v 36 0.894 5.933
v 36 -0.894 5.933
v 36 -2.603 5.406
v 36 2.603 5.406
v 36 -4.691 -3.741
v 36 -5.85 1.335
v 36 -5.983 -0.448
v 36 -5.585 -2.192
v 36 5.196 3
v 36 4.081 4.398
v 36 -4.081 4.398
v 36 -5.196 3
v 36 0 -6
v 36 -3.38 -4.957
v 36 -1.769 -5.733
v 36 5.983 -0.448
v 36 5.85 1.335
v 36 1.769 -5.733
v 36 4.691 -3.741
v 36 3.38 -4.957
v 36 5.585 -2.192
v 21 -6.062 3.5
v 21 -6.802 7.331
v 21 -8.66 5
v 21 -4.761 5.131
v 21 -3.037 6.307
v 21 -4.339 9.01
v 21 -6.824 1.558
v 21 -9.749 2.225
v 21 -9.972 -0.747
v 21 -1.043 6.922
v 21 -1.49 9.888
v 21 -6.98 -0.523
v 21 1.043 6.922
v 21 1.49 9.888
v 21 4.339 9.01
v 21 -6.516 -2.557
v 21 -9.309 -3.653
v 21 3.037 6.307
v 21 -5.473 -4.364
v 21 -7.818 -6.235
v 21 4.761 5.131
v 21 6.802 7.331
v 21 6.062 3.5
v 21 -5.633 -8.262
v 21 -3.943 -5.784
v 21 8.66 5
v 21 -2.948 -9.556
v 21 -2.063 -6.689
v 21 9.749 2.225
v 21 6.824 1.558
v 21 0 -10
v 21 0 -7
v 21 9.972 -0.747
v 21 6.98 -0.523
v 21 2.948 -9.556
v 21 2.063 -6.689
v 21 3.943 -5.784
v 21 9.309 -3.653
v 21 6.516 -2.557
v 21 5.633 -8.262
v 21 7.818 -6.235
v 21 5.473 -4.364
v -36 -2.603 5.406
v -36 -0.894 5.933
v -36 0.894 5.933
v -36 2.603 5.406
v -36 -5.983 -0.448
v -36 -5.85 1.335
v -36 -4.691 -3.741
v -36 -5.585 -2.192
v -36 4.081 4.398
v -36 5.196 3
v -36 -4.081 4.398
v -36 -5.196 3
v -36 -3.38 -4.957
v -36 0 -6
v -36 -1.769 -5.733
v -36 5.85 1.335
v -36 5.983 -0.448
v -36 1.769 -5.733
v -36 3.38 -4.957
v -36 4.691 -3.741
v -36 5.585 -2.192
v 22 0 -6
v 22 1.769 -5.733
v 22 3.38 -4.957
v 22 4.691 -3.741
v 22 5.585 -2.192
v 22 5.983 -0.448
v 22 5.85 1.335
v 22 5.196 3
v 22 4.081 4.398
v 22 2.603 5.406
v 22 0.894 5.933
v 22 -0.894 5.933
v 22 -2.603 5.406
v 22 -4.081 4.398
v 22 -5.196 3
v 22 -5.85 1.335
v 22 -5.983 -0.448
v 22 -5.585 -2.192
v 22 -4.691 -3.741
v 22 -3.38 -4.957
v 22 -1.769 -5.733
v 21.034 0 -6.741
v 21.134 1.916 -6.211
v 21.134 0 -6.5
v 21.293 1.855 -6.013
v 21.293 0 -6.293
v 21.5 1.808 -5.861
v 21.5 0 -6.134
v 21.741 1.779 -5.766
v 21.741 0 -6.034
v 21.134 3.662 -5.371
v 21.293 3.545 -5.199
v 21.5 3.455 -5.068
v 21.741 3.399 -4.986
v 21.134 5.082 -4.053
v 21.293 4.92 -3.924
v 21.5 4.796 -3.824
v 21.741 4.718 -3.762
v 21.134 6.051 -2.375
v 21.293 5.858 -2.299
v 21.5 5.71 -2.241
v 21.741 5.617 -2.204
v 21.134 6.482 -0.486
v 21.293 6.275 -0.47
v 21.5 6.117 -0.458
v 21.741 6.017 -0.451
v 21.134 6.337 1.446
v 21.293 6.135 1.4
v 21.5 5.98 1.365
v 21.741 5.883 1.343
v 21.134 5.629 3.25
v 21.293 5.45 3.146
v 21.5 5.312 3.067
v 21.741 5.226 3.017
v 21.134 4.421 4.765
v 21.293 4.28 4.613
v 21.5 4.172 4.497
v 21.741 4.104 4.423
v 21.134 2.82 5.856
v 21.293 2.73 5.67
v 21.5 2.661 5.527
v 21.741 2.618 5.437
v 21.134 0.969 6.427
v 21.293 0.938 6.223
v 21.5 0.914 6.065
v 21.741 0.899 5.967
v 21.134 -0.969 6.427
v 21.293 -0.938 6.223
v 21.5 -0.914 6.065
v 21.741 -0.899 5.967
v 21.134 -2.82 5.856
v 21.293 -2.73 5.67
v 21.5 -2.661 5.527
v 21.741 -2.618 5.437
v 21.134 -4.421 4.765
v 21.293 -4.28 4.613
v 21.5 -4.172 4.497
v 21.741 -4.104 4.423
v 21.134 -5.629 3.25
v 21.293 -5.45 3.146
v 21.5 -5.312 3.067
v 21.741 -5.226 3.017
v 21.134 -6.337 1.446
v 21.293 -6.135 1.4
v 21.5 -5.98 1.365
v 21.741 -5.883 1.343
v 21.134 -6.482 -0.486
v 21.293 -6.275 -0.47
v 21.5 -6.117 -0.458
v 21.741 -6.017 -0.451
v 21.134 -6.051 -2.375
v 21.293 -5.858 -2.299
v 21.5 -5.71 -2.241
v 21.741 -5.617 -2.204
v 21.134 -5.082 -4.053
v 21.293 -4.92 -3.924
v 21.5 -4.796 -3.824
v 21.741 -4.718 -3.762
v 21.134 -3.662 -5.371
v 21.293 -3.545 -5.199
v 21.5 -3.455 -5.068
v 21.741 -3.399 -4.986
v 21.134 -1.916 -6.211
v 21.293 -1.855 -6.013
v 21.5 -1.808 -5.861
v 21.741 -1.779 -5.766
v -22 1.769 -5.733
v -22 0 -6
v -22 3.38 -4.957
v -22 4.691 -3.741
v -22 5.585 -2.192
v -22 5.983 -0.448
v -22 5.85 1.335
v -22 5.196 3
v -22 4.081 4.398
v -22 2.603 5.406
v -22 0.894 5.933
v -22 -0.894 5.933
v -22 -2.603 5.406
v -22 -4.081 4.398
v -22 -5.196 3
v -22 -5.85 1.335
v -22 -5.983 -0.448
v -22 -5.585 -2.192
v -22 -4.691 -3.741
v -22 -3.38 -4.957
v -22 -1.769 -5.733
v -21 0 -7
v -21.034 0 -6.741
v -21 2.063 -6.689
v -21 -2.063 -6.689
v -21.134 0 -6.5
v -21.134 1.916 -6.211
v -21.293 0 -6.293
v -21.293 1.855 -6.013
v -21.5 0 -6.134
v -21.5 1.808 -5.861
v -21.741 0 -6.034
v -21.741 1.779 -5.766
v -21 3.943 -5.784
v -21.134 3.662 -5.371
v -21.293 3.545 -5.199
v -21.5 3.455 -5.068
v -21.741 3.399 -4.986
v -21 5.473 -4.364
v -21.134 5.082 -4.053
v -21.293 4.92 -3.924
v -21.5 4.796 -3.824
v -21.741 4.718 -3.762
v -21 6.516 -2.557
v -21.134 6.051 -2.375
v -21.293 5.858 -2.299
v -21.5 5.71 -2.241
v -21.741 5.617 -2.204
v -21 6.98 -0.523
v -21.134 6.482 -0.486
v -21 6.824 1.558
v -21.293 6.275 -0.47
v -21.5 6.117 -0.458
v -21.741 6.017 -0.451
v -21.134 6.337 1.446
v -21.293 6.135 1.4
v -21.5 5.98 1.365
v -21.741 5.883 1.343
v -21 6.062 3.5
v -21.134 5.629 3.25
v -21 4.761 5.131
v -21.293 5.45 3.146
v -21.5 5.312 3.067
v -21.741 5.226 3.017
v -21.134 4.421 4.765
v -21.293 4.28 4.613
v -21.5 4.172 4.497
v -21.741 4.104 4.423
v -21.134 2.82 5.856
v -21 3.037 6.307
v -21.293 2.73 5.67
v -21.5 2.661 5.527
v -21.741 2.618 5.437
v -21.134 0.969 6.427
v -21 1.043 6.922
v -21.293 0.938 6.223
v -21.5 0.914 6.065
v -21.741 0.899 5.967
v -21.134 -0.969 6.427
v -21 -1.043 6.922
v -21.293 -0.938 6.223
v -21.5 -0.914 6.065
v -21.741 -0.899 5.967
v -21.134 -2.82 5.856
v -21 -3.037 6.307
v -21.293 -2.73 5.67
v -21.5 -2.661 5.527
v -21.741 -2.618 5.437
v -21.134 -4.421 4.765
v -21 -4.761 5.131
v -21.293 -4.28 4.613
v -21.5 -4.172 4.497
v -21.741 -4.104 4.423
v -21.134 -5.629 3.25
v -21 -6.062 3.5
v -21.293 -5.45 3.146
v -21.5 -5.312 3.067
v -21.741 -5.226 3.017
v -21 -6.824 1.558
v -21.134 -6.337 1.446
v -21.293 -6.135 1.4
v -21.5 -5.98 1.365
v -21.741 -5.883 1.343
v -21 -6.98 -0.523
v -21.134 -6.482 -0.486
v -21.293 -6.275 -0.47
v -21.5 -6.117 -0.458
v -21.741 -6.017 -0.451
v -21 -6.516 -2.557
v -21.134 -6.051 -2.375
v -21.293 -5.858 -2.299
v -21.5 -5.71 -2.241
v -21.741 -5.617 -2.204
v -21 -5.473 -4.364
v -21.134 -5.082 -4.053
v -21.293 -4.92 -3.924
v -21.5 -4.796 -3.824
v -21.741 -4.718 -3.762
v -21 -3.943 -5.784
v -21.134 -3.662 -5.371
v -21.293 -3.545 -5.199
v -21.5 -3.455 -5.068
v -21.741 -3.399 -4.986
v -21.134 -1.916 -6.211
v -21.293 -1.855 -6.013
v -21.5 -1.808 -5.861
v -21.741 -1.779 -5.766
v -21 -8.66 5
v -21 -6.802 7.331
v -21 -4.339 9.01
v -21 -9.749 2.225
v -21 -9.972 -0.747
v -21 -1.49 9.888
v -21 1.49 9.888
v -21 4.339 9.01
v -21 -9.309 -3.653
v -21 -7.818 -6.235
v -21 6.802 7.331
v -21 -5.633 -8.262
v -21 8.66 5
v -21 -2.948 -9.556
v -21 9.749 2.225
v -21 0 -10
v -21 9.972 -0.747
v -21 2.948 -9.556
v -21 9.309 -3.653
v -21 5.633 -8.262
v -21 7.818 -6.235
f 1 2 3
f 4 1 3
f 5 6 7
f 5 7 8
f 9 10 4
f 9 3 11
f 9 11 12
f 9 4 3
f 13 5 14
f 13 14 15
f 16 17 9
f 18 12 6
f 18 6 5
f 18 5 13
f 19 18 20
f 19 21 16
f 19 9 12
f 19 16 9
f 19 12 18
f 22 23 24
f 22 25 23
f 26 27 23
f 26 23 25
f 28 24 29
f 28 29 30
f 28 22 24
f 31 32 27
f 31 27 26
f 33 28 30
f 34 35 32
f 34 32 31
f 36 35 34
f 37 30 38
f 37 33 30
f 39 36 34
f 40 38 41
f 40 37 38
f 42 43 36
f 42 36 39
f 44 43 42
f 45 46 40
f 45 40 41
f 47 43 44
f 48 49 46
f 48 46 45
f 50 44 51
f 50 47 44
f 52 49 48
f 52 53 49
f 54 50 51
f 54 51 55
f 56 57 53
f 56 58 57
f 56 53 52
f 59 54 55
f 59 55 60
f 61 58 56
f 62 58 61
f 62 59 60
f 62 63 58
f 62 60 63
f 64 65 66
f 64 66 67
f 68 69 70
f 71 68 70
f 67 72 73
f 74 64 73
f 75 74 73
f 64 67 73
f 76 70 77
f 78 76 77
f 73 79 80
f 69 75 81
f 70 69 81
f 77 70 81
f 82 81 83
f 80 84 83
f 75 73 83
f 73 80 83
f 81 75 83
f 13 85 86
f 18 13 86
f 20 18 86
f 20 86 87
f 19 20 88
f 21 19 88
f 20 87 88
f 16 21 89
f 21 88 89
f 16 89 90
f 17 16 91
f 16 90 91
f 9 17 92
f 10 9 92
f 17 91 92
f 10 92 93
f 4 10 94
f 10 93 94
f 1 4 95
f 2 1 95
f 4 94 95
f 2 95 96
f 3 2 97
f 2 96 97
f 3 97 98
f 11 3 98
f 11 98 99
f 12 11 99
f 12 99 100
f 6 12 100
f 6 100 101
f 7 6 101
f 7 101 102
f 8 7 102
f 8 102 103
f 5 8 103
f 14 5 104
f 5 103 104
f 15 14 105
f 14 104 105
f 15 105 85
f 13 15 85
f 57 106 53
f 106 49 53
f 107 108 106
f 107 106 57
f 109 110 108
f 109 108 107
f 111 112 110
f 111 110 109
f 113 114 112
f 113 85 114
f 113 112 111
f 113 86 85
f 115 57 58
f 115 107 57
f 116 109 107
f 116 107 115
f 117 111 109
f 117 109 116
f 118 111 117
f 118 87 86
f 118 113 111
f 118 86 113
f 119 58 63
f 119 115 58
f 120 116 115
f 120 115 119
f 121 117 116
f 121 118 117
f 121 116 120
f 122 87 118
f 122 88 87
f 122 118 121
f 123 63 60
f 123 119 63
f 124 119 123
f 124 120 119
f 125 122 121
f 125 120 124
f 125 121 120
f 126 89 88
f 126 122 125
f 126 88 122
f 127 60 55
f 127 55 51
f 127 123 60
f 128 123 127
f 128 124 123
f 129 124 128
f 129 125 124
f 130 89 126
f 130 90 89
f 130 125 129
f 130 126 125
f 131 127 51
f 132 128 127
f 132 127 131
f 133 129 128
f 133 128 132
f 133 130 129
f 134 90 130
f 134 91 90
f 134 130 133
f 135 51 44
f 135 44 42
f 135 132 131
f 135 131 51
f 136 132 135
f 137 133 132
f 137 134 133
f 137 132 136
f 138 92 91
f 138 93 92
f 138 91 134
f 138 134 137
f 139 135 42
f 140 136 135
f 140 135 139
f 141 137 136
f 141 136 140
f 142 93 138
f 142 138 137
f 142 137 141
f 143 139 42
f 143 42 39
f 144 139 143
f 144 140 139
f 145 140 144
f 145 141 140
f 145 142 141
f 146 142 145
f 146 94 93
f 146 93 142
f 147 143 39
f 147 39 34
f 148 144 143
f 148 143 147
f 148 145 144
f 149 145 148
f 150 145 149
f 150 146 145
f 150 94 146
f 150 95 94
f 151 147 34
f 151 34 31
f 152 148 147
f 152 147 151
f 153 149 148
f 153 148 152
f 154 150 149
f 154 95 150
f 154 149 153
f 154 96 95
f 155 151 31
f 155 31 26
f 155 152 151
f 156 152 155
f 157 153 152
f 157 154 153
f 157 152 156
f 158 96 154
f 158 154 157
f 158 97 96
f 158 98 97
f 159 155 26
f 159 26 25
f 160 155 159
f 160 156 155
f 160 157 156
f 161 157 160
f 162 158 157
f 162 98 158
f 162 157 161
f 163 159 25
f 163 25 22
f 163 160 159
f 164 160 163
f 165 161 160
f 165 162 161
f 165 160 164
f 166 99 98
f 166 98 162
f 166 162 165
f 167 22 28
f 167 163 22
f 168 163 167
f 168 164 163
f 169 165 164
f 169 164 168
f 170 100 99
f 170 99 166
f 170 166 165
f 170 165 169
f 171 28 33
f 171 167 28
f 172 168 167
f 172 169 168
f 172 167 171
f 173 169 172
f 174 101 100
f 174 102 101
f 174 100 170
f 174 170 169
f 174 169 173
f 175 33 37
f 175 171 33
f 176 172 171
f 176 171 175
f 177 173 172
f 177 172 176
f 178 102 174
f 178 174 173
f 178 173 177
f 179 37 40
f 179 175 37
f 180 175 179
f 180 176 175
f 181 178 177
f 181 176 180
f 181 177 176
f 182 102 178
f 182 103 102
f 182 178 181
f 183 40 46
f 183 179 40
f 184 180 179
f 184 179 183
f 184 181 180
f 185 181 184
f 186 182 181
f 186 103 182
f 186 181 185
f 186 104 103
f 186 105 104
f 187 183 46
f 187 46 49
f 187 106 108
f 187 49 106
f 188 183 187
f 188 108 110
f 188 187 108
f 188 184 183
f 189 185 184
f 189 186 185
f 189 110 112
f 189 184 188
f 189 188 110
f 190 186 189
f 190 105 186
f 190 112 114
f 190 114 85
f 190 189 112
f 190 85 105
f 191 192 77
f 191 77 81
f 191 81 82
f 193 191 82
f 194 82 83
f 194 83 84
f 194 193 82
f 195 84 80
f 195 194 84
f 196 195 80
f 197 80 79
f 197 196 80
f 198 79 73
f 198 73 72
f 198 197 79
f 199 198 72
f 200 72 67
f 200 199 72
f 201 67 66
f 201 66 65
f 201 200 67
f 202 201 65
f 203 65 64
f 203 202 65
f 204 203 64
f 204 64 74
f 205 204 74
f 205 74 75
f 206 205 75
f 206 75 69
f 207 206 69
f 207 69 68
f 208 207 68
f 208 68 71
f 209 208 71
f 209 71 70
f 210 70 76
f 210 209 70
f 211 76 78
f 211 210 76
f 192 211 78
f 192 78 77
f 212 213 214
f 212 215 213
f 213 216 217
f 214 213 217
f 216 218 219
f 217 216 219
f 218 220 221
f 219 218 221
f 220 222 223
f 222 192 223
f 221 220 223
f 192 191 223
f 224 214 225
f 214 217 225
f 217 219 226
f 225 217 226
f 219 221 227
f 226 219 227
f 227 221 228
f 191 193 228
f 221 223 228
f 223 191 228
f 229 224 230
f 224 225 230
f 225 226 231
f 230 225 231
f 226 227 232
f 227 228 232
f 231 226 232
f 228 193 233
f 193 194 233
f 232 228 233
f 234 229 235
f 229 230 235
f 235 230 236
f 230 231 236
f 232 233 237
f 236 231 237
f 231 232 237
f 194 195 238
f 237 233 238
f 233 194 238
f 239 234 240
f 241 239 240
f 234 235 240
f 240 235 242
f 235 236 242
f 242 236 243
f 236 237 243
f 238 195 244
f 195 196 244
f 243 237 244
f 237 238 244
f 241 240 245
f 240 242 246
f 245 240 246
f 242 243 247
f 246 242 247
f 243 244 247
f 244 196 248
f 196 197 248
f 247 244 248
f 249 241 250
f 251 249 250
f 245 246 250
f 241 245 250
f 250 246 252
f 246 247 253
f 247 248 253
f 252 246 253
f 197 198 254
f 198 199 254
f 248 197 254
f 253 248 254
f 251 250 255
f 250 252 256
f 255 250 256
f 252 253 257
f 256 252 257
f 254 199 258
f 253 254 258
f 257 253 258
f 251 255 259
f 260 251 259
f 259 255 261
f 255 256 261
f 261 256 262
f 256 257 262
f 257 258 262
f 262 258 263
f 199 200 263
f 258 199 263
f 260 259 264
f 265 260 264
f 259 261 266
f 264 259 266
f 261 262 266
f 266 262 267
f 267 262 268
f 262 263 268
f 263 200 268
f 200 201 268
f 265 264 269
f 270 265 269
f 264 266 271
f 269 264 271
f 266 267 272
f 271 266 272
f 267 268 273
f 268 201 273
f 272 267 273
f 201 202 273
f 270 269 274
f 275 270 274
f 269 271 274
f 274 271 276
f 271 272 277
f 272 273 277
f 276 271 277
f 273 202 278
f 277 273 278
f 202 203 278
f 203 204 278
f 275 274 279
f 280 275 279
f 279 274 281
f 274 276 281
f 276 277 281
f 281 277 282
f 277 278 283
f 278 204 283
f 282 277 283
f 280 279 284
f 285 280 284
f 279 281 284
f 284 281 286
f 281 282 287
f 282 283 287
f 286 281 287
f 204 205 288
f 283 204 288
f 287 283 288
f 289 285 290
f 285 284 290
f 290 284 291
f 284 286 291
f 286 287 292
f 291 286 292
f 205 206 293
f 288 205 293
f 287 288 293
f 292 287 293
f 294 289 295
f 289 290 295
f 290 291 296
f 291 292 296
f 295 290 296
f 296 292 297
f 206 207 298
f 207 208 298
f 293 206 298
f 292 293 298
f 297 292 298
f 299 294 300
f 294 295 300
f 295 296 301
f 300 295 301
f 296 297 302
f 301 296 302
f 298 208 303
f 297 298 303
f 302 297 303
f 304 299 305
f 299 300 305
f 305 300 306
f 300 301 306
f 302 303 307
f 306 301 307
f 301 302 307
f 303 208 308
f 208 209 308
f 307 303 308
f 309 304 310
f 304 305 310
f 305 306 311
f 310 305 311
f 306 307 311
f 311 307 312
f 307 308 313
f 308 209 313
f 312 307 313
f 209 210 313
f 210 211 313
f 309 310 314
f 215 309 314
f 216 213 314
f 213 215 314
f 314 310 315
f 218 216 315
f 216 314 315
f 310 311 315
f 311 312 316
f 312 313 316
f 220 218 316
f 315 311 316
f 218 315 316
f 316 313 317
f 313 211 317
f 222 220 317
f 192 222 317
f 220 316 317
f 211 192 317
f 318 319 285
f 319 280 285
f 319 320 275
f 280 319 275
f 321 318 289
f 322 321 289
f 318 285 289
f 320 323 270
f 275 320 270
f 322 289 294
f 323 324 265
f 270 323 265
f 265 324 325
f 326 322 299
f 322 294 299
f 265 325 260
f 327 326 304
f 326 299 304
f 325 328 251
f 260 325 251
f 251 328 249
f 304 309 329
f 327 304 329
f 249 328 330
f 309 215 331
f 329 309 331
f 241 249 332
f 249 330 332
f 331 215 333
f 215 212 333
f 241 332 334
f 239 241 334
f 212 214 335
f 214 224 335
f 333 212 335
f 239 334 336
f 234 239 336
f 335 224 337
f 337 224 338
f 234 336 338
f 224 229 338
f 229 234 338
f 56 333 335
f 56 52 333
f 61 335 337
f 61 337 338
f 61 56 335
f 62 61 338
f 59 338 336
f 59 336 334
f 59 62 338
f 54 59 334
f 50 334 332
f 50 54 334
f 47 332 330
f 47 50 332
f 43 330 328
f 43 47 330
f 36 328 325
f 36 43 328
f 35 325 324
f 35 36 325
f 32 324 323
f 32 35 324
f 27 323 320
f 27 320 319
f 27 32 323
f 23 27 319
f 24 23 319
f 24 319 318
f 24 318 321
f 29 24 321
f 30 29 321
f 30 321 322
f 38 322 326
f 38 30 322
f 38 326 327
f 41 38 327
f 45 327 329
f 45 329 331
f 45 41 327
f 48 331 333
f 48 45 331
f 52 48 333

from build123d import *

# Parameters (mm, degrees)
SKETCH1_R           = 10
BOSS_EXTRUDE1_DEPTH = 21
SKETCH_1_R          = 6
EXTRUDE_1_DEPTH     = 15
FILLET_1_R          = 1


with BuildPart() as part:
    # Sketch1 → Boss-Extrude1 (new body, symmetric)
    with BuildSketch(Plane(origin=(0, 0, 0), x_dir=(0, 0, -1), z_dir=(1, 0, 0))):
        Circle(SKETCH1_R)
    extrude(amount=BOSS_EXTRUDE1_DEPTH, both=True)

    # 草图1 → 凸台-拉伸1 (add)
    with BuildSketch(Plane(origin=(21, 0, 0), x_dir=(0, 0, -1), z_dir=(1, 0, 0))):
        Circle(SKETCH_1_R)
    extrude_1 = extrude(amount=EXTRUDE_1_DEPTH)

    # 镜向1: 凸台-拉伸1 across plane
    add(extrude_1.mirror(Plane(origin=(0, 0, 0), x_dir=(0, 0, 1), z_dir=(1, 0, 0))))

    # 圆角1
    fillet_1_edges = [part.edges().sort_by_distance(p)[0] for p in [
        (-21, 0, 6),
        (21, 0, 6),
    ]]
    fillet(fillet_1_edges, radius=FILLET_1_R)


solid = part.part
